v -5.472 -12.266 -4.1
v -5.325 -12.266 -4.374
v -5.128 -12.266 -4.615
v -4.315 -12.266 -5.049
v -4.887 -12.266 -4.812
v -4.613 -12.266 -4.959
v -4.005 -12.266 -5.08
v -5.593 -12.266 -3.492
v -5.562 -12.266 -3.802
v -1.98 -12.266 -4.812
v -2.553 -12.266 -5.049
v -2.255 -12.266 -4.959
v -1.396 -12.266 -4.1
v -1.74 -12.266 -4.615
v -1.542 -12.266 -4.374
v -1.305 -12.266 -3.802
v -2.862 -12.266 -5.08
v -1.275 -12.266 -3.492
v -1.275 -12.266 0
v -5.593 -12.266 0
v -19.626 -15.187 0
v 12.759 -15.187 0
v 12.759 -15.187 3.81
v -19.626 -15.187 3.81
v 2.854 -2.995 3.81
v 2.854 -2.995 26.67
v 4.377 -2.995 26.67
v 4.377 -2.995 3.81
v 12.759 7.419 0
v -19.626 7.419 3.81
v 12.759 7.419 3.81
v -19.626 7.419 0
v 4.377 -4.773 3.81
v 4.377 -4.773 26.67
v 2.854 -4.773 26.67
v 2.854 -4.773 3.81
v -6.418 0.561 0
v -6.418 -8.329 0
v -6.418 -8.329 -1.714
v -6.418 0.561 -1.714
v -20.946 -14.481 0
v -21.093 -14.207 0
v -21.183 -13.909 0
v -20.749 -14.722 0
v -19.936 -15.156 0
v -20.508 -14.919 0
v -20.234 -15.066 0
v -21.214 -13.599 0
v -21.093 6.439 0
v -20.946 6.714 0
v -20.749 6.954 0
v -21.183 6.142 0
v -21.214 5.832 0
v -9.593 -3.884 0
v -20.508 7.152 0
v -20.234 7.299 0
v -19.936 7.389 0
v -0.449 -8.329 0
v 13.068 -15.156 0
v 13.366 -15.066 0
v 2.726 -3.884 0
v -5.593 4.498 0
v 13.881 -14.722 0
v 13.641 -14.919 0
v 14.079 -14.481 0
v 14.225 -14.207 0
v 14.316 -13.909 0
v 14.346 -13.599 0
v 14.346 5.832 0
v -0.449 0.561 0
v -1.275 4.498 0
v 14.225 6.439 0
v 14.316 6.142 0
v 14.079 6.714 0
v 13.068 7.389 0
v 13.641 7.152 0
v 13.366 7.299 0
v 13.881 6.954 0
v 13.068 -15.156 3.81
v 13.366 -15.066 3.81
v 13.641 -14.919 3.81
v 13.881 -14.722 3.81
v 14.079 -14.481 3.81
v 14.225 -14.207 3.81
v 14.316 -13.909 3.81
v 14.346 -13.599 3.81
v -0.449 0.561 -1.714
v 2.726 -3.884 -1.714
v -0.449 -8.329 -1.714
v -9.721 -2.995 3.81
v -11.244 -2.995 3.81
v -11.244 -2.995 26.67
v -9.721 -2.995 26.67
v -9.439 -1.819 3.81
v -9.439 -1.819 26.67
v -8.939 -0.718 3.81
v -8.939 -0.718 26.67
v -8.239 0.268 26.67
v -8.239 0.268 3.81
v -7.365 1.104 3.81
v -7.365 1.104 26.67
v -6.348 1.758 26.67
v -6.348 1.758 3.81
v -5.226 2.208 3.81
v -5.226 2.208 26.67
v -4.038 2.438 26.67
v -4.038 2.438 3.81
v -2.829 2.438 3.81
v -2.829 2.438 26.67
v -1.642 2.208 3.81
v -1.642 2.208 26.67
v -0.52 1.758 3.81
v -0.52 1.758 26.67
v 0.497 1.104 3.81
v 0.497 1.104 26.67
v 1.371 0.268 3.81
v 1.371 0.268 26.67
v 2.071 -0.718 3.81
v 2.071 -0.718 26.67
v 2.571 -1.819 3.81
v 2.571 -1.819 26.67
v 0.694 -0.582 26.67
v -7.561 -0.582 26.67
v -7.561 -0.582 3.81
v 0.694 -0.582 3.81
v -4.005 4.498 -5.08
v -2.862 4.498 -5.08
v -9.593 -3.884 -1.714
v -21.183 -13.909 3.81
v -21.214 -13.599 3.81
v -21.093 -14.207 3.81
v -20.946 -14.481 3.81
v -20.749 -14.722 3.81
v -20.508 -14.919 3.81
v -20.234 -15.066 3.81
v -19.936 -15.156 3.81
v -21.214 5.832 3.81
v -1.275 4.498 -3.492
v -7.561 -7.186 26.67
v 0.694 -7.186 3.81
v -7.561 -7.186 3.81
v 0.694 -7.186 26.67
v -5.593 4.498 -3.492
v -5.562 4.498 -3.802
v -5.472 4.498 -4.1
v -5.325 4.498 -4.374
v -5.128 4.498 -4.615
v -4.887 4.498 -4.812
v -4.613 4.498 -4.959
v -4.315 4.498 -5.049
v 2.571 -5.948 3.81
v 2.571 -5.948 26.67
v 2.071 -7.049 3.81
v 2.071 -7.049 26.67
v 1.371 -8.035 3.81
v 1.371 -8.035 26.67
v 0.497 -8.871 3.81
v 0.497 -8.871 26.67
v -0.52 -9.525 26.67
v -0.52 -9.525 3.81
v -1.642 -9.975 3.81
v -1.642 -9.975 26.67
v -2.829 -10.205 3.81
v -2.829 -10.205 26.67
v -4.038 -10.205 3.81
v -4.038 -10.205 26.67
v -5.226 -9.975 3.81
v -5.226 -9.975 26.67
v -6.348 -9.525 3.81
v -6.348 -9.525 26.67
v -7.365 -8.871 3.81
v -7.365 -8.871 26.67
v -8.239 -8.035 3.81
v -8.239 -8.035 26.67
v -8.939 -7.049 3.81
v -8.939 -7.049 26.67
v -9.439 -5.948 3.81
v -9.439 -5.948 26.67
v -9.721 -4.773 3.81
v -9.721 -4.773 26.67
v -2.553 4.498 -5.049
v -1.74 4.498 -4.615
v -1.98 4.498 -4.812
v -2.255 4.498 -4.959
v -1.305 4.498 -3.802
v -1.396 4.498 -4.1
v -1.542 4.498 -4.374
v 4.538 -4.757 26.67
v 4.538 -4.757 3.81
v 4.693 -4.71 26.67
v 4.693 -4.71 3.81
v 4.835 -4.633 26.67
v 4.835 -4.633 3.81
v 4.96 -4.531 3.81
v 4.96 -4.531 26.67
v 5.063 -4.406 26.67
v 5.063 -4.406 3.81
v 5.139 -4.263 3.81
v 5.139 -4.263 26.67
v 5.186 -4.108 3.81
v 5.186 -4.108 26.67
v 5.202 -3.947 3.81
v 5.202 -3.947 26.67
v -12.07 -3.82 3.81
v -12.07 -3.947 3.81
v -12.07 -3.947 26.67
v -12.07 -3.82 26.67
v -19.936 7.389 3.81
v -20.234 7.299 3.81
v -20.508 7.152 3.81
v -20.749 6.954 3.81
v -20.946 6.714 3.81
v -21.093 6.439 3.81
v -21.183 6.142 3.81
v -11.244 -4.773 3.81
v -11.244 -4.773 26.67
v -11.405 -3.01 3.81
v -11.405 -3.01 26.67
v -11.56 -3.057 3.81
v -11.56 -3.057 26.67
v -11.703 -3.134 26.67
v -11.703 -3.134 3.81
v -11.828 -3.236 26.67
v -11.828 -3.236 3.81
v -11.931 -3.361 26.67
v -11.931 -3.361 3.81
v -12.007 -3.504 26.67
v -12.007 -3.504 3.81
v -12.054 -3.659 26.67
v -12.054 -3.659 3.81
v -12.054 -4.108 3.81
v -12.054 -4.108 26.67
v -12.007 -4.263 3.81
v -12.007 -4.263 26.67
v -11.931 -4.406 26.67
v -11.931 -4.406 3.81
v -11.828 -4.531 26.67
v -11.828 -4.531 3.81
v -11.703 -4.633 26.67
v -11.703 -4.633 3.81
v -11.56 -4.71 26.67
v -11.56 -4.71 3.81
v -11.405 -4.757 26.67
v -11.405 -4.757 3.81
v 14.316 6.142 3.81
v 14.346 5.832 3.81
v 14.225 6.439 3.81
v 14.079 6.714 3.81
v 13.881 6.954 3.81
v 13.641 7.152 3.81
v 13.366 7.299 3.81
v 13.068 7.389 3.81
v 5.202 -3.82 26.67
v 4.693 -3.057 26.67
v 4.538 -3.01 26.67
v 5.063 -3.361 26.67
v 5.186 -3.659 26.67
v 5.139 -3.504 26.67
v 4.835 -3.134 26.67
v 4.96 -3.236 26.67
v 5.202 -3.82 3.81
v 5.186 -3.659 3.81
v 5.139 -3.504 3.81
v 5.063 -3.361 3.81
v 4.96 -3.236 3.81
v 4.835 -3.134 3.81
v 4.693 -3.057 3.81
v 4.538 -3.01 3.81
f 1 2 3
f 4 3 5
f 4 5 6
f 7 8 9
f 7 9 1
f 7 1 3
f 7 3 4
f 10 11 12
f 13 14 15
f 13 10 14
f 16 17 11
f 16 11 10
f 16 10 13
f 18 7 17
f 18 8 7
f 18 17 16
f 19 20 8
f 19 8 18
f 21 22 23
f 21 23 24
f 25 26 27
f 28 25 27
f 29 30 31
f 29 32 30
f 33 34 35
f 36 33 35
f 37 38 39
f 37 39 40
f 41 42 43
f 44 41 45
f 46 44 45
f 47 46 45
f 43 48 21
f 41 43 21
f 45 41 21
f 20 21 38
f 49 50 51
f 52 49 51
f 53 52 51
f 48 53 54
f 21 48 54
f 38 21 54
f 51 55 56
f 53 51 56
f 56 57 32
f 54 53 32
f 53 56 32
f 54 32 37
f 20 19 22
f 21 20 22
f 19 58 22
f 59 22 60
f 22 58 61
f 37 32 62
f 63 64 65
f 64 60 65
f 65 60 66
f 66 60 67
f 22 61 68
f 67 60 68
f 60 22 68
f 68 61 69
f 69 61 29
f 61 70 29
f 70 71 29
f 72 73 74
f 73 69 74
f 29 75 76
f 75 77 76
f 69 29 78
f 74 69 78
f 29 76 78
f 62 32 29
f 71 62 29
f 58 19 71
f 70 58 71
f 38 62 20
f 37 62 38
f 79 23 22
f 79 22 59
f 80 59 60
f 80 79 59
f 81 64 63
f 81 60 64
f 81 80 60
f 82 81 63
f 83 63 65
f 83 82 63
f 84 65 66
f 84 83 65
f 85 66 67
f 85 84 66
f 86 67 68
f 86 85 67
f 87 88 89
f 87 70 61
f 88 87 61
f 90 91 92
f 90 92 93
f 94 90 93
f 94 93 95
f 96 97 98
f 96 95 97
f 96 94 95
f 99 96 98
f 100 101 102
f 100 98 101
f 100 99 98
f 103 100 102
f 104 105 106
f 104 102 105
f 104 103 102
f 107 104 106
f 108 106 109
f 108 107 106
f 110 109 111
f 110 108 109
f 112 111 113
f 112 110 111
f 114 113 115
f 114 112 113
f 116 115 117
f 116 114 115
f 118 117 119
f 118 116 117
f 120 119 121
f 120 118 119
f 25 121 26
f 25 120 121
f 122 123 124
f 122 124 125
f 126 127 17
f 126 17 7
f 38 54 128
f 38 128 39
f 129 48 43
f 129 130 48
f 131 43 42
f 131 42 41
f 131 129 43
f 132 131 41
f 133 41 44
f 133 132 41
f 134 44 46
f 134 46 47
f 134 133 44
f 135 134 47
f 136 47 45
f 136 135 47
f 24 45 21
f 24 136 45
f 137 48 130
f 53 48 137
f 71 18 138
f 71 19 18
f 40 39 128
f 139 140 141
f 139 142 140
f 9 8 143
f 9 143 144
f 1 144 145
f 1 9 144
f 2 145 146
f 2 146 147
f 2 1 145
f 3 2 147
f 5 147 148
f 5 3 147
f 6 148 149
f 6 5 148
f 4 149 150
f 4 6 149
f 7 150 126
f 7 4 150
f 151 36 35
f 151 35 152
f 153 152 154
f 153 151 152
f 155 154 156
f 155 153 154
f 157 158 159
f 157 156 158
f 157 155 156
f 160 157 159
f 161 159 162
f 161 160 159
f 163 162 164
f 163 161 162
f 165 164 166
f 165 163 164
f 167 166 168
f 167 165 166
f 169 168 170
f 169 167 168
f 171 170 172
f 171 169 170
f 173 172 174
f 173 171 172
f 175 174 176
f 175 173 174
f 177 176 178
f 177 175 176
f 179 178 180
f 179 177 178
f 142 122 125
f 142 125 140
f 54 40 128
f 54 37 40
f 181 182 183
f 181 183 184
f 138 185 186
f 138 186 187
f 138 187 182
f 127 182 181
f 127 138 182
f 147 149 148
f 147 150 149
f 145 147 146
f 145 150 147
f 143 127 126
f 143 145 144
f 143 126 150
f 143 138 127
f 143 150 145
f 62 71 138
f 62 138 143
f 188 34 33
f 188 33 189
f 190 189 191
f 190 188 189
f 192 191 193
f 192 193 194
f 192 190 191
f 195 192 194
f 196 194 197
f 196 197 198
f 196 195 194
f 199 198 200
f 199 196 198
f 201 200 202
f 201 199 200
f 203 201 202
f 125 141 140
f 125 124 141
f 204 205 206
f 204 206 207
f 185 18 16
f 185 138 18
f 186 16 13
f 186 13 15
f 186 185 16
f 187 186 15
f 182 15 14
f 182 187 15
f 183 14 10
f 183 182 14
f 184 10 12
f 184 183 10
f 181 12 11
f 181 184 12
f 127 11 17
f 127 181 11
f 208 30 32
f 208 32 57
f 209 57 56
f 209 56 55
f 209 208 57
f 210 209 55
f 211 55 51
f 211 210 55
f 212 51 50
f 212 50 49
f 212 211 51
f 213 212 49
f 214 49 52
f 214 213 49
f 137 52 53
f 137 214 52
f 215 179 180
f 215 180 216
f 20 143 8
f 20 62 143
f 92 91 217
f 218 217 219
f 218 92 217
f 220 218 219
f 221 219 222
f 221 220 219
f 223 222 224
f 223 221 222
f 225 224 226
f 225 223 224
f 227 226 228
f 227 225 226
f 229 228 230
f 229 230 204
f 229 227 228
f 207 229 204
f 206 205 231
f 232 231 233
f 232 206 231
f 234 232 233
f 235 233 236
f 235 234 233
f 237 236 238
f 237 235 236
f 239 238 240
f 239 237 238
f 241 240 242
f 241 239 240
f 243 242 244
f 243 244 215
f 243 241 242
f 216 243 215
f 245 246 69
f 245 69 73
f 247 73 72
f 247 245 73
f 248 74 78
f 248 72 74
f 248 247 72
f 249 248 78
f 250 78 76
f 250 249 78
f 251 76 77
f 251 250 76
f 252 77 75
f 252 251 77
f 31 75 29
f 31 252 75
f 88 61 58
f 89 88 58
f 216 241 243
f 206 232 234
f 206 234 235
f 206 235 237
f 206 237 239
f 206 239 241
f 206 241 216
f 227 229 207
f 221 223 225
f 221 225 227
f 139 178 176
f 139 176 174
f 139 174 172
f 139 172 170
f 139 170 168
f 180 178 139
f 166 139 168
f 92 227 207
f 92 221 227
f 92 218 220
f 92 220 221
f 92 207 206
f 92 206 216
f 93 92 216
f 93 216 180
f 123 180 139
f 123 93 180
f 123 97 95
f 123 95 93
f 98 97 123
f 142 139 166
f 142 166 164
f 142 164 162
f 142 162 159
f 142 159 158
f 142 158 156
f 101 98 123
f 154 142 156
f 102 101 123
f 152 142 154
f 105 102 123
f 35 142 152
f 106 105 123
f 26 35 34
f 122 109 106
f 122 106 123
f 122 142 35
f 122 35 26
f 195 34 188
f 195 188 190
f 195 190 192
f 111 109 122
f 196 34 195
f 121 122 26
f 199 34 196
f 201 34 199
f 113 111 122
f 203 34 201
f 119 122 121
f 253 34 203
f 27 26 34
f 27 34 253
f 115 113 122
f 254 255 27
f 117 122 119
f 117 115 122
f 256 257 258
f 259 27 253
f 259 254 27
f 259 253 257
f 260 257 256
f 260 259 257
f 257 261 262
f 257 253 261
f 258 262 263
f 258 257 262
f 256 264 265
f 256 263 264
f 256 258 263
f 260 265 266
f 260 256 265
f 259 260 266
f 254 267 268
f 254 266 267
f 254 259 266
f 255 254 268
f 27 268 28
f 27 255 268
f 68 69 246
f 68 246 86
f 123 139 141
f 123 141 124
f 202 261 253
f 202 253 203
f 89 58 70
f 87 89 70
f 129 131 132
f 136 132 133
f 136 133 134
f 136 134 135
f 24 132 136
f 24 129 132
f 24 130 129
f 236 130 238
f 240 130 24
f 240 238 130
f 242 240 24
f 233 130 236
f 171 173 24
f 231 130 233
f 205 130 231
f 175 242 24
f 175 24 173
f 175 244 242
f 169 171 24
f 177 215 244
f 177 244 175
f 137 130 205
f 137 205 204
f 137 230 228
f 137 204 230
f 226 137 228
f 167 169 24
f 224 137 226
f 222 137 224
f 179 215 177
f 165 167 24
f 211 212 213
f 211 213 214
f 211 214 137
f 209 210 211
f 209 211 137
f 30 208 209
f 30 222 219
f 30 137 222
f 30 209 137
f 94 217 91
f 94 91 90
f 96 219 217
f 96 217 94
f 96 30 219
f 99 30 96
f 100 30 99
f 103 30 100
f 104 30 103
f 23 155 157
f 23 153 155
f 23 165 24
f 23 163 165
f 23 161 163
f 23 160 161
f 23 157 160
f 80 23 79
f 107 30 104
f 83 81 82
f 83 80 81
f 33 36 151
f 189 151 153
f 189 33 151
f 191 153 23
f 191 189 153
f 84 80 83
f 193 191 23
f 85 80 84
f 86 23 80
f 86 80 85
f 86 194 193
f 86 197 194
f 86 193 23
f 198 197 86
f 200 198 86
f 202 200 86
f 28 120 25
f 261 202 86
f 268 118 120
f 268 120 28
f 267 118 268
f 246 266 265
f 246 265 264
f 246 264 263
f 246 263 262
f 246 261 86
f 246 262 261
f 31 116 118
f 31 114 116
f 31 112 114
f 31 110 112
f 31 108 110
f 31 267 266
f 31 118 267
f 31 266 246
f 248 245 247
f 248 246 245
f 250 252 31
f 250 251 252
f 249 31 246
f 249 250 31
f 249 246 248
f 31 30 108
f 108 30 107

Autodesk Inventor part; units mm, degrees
ref_plane "YZ Plane" through (0, 0, 0) normal (1, 0, 0) x (0, 1, 0)
ref_plane "XZ Plane" through (0, 0, 0) normal (0, 1, 0) x (-1, 0, 0)
ref_plane "XY Plane" through (0, 0, 0) normal (0, 0, 1) x (1, 0, 0)
sketch "Sketch1" plane through (0, 0, 0) normal (0, 0, 1) x (1, 0, 0)
  line L0 (-21.2139, 7.4194) -> (14.3461, 7.4194)
  line L1 (14.3461, 7.4194) -> (14.3461, -15.1866)
  line L2 (14.3461, -15.1866) -> (-21.2139, -15.1866)
  line L3 (-21.2139, -15.1866) -> (-21.2139, 7.4194)
  point P0 (0, 0)
  dimension "d0" = 22.606
  dimension "d1" = 35.56
extrude "Extrusion1" add sketch "Sketch1" along normal blind 3.81
sketch "Sketch2" plane through (0, 0, 3.81) normal (0, 0, 1) x (1, 0, 0)
  line L0 (14.3461, 7.4194) -> (-21.2139, 7.4194) projected
  line L1 (-21.2139, -15.1866) -> (14.3461, -15.1866) projected
  line L2 (14.3461, -15.1866) -> (14.3461, 7.4194) projected
  line L3 (-21.2139, 7.4194) -> (-21.2139, -15.1866) projected
  line L4 (5.2021, -2.9946) -> (5.2021, -4.7726)
  line L5 (-12.0699, -4.7726) -> (-12.0699, -2.9946)
  line L6 (5.2021, -4.7726) -> (2.8536, -4.7726)
  line L7 (-9.7213, -4.7726) -> (-12.0699, -4.7726)
  line L8 (-12.0699, -2.9946) -> (-9.7213, -2.9946)
  line L9 (2.8536, -2.9946) -> (5.2021, -2.9946)
  arc A0 (-9.7213, -4.7726) -> (2.8536, -4.7726) centre (-3.4339, -3.8836) ccw
  arc A1 (2.8536, -2.9946) -> (-9.7213, -2.9946) centre (-3.4339, -3.8836) ccw
  point P0 (0, 0)
  dimension "d5" = 11.303
  dimension "d6" = 11.303
  dimension "d7" = 17.78
  dimension "d8" = 17.78
  dimension "d9" = 17.272
  dimension "d10" = 1.778
  dimension "d13" = 9.144
  dimension "d14" = 9.144
extrude "Extrusion2" add sketch "Sketch2" along normal blind 22.86 contours L4 L6 A0 L7 L5 L8 A1 L9
sketch "Sketch3" plane through (0, 0, 26.67) normal (0, 0, 1) x (1, 0, 0)
  line L0 (-7.5614, -0.5816) -> (0.6936, -0.5816)
  line L1 (0.6936, -0.5816) -> (0.6936, -7.1856)
  line L2 (0.6936, -7.1856) -> (-7.5614, -7.1856)
  line L3 (-7.5614, -7.1856) -> (-7.5614, -0.5816)
  line L4 (-12.0699, -2.9946) -> (-12.0699, -4.7726) projected
  line L5 (5.2021, -4.7726) -> (5.2021, -2.9946) projected
  arc A0 (2.8536, -2.9946) -> (-9.7213, -2.9946) centre (-3.4339, -3.8836) ccw projected
  arc A1 (-9.7213, -4.7726) -> (2.8536, -4.7726) centre (-3.4339, -3.8836) ccw projected
  point P0 (0, 0)
  point P1 (-12.0699, -3.8836)
  point P2 (5.2021, -3.8836)
  point P3 (-3.4339, 2.4664)
  point P4 (-3.4339, -10.2336)
  dimension "d17" = 8.255
  dimension "d18" = 6.604
  dimension "d19" = 4.5085
  dimension "d20" = 4.5085
  dimension "d21" = 3.048
  dimension "d22" = 3.048
extrude "Extrusion3" cut sketch "Sketch3" against normal blind 22.86
sketch "Sketch4" plane through (0, 0, 0) normal (0, 0, -1) x (-1, 0, 0)
  line L0 (1.2749, 4.4984) -> (5.5929, 4.4984)
  line L1 (5.5929, 4.4984) -> (5.5929, -12.2656)
  line L2 (5.5929, -12.2656) -> (1.2749, -12.2656)
  line L3 (1.2749, -12.2656) -> (1.2749, 4.4984)
  line L4 (-14.3461, 7.4194) -> (21.2139, 7.4194) projected
  line L5 (21.2139, -15.1866) -> (-14.3461, -15.1866) projected
  line L6 (21.2139, 7.4194) -> (21.2139, -15.1866) projected
  line L7 (-14.3461, -15.1866) -> (-14.3461, 7.4194) projected
  point P0 (0, 0)
  point P1 (21.2139, -3.8836)
  dimension "d25" = 4.318
  dimension "d26" = 16.764
  dimension "d27" = 2.921
  dimension "d28" = 2.921
  dimension "d29" = 15.621
  dimension "d30" = 15.621
extrude "Extrusion4" add sketch "Sketch4" along normal blind 5.08 contours L0 L1 L2 L3
fillet "Fillet1" radius 1.5875 2 edges at (-5.5929, -3.8836, -5.08) (-1.2749, -3.8836, -5.08)
fillet "Fillet2" radius 0.8255 4 edges at (-12.0699, -4.7726, 15.24) (-12.0699, -2.9946, 15.24) (5.2021, -4.7726, 15.24) (5.2021, -2.9946, 15.24)
sketch "Sketch5" plane through (0, 0, 0) normal (0, 0, -1) x (-1, 0, 0)
  line L0 (6.4184, -8.3286) -> (6.4184, 0.5614)
  line L1 (6.4184, 0.5614) -> (9.5934, -3.8836)
  line L2 (9.5934, -3.8836) -> (6.4184, -8.3286)
  line L3 (0.4494, -8.3286) -> (0.4494, 0.5614)
  line L4 (0.4494, 0.5614) -> (-2.7256, -3.8836)
  line L5 (-2.7256, -3.8836) -> (0.4494, -8.3286)
  line L6 (5.5929, -12.2656) -> (5.5929, 4.4984) projected
  line L7 (1.2749, 4.4984) -> (1.2749, -12.2656) projected
  line L8 (21.2139, -15.1866) -> (-14.3461, -15.1866) projected
  line L9 (-14.3461, 7.4194) -> (21.2139, 7.4194) projected
  point P0 (0, 0)
  dimension "d35" = 3.175
  dimension "d36" = 8.89
  dimension "d37" = 0.8255
  dimension "d38" = 0.8255
  dimension "d39" = 6.858
  dimension "d40" = 6.858
  dimension "d41" = 6.858
  dimension "d42" = 6.858
  dimension "d43" = 4.445
  dimension "d44" = 4.445
  dimension "d45" = 4.445
extrude "Extrusion5" add sketch "Sketch5" along normal blind 1.7145
fillet "Fillet3" radius 1.5875 4 edges at (14.3461, 7.4194, 1.905) (14.3461, -15.1866, 1.905) (-21.2139, -15.1866, 1.905) (-21.2139, 7.4194, 1.905)
properties part number "power_switch"
